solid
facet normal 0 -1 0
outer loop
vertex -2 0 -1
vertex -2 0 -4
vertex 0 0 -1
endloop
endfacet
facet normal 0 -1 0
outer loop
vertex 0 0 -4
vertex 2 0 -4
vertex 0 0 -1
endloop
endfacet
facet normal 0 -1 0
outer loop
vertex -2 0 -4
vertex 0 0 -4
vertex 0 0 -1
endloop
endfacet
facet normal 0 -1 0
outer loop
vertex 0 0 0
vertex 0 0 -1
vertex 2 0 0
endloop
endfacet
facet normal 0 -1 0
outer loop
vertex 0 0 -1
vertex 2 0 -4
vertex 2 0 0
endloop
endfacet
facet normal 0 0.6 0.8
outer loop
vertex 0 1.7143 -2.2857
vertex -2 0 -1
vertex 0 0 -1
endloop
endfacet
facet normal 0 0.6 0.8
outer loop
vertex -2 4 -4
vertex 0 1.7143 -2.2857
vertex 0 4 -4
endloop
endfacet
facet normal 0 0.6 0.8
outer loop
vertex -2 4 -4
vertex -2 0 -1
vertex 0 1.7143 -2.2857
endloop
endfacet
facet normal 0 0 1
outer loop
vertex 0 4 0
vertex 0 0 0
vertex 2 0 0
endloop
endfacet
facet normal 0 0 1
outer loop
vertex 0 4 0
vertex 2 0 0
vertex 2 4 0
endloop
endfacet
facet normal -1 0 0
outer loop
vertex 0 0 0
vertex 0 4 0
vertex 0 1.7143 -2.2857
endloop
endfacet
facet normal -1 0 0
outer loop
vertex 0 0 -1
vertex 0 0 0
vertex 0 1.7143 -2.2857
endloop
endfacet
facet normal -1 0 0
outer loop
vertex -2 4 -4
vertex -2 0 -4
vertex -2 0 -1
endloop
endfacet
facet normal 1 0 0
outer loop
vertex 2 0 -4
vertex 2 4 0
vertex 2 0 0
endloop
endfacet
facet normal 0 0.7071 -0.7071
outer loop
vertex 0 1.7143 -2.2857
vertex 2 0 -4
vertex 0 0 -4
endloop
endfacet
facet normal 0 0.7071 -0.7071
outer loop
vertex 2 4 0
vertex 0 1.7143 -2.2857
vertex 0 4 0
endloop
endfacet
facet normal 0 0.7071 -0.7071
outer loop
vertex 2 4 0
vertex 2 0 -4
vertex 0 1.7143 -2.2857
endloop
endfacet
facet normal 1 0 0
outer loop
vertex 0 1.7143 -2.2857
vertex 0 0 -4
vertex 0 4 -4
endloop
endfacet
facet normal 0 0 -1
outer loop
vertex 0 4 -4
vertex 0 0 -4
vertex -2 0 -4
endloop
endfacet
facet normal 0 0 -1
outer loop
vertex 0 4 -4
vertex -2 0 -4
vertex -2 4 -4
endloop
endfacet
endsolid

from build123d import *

# Parameters (mm, degrees)
SKETCH1_W           = 4
SKETCH1_H           = 4
BOSS_EXTRUDE1_DEPTH = 2
SKETCH2_W           = 3
SKETCH2_H           = 4
BOSS_EXTRUDE2_DEPTH = 2
CUT_EXTRUDE1_DEPTH  = 2
CUT_EXTRUDE2_DEPTH  = 2


with BuildPart() as part:
    # Sketch1 → Boss-Extrude1 (new body)
    with BuildSketch(Plane(origin=(0, 0, 0), x_dir=(0, 0, -1), z_dir=(1, 0, 0))):
        with Locations((2, 2)):
            Rectangle(SKETCH1_W, SKETCH1_H)
    extrude(amount=BOSS_EXTRUDE1_DEPTH)

    # Sketch2 → Boss-Extrude2 (add)
    with BuildSketch(Plane.ZY):
        with Locations((-2.5, 2)):
            Rectangle(SKETCH2_W, SKETCH2_H)
    extrude(amount=BOSS_EXTRUDE2_DEPTH)

    # Sketch3 → Cut-Extrude1 (cut)
    with BuildSketch(Plane(origin=(2, 0, 0), x_dir=(0, 0, -1), z_dir=(1, 0, 0))):
        Polygon((4, 0), (0, 4), (4, 4), align=None)
    extrude(amount=-CUT_EXTRUDE1_DEPTH, mode=Mode.SUBTRACT)

    # Sketch4 → Cut-Extrude2 (cut)
    with BuildSketch(Plane.ZY.offset(2)):
        Polygon((-1, 0), (-4, 4), (-1, 4), align=None)
    extrude(amount=-CUT_EXTRUDE2_DEPTH, mode=Mode.SUBTRACT)


solid = part.part
